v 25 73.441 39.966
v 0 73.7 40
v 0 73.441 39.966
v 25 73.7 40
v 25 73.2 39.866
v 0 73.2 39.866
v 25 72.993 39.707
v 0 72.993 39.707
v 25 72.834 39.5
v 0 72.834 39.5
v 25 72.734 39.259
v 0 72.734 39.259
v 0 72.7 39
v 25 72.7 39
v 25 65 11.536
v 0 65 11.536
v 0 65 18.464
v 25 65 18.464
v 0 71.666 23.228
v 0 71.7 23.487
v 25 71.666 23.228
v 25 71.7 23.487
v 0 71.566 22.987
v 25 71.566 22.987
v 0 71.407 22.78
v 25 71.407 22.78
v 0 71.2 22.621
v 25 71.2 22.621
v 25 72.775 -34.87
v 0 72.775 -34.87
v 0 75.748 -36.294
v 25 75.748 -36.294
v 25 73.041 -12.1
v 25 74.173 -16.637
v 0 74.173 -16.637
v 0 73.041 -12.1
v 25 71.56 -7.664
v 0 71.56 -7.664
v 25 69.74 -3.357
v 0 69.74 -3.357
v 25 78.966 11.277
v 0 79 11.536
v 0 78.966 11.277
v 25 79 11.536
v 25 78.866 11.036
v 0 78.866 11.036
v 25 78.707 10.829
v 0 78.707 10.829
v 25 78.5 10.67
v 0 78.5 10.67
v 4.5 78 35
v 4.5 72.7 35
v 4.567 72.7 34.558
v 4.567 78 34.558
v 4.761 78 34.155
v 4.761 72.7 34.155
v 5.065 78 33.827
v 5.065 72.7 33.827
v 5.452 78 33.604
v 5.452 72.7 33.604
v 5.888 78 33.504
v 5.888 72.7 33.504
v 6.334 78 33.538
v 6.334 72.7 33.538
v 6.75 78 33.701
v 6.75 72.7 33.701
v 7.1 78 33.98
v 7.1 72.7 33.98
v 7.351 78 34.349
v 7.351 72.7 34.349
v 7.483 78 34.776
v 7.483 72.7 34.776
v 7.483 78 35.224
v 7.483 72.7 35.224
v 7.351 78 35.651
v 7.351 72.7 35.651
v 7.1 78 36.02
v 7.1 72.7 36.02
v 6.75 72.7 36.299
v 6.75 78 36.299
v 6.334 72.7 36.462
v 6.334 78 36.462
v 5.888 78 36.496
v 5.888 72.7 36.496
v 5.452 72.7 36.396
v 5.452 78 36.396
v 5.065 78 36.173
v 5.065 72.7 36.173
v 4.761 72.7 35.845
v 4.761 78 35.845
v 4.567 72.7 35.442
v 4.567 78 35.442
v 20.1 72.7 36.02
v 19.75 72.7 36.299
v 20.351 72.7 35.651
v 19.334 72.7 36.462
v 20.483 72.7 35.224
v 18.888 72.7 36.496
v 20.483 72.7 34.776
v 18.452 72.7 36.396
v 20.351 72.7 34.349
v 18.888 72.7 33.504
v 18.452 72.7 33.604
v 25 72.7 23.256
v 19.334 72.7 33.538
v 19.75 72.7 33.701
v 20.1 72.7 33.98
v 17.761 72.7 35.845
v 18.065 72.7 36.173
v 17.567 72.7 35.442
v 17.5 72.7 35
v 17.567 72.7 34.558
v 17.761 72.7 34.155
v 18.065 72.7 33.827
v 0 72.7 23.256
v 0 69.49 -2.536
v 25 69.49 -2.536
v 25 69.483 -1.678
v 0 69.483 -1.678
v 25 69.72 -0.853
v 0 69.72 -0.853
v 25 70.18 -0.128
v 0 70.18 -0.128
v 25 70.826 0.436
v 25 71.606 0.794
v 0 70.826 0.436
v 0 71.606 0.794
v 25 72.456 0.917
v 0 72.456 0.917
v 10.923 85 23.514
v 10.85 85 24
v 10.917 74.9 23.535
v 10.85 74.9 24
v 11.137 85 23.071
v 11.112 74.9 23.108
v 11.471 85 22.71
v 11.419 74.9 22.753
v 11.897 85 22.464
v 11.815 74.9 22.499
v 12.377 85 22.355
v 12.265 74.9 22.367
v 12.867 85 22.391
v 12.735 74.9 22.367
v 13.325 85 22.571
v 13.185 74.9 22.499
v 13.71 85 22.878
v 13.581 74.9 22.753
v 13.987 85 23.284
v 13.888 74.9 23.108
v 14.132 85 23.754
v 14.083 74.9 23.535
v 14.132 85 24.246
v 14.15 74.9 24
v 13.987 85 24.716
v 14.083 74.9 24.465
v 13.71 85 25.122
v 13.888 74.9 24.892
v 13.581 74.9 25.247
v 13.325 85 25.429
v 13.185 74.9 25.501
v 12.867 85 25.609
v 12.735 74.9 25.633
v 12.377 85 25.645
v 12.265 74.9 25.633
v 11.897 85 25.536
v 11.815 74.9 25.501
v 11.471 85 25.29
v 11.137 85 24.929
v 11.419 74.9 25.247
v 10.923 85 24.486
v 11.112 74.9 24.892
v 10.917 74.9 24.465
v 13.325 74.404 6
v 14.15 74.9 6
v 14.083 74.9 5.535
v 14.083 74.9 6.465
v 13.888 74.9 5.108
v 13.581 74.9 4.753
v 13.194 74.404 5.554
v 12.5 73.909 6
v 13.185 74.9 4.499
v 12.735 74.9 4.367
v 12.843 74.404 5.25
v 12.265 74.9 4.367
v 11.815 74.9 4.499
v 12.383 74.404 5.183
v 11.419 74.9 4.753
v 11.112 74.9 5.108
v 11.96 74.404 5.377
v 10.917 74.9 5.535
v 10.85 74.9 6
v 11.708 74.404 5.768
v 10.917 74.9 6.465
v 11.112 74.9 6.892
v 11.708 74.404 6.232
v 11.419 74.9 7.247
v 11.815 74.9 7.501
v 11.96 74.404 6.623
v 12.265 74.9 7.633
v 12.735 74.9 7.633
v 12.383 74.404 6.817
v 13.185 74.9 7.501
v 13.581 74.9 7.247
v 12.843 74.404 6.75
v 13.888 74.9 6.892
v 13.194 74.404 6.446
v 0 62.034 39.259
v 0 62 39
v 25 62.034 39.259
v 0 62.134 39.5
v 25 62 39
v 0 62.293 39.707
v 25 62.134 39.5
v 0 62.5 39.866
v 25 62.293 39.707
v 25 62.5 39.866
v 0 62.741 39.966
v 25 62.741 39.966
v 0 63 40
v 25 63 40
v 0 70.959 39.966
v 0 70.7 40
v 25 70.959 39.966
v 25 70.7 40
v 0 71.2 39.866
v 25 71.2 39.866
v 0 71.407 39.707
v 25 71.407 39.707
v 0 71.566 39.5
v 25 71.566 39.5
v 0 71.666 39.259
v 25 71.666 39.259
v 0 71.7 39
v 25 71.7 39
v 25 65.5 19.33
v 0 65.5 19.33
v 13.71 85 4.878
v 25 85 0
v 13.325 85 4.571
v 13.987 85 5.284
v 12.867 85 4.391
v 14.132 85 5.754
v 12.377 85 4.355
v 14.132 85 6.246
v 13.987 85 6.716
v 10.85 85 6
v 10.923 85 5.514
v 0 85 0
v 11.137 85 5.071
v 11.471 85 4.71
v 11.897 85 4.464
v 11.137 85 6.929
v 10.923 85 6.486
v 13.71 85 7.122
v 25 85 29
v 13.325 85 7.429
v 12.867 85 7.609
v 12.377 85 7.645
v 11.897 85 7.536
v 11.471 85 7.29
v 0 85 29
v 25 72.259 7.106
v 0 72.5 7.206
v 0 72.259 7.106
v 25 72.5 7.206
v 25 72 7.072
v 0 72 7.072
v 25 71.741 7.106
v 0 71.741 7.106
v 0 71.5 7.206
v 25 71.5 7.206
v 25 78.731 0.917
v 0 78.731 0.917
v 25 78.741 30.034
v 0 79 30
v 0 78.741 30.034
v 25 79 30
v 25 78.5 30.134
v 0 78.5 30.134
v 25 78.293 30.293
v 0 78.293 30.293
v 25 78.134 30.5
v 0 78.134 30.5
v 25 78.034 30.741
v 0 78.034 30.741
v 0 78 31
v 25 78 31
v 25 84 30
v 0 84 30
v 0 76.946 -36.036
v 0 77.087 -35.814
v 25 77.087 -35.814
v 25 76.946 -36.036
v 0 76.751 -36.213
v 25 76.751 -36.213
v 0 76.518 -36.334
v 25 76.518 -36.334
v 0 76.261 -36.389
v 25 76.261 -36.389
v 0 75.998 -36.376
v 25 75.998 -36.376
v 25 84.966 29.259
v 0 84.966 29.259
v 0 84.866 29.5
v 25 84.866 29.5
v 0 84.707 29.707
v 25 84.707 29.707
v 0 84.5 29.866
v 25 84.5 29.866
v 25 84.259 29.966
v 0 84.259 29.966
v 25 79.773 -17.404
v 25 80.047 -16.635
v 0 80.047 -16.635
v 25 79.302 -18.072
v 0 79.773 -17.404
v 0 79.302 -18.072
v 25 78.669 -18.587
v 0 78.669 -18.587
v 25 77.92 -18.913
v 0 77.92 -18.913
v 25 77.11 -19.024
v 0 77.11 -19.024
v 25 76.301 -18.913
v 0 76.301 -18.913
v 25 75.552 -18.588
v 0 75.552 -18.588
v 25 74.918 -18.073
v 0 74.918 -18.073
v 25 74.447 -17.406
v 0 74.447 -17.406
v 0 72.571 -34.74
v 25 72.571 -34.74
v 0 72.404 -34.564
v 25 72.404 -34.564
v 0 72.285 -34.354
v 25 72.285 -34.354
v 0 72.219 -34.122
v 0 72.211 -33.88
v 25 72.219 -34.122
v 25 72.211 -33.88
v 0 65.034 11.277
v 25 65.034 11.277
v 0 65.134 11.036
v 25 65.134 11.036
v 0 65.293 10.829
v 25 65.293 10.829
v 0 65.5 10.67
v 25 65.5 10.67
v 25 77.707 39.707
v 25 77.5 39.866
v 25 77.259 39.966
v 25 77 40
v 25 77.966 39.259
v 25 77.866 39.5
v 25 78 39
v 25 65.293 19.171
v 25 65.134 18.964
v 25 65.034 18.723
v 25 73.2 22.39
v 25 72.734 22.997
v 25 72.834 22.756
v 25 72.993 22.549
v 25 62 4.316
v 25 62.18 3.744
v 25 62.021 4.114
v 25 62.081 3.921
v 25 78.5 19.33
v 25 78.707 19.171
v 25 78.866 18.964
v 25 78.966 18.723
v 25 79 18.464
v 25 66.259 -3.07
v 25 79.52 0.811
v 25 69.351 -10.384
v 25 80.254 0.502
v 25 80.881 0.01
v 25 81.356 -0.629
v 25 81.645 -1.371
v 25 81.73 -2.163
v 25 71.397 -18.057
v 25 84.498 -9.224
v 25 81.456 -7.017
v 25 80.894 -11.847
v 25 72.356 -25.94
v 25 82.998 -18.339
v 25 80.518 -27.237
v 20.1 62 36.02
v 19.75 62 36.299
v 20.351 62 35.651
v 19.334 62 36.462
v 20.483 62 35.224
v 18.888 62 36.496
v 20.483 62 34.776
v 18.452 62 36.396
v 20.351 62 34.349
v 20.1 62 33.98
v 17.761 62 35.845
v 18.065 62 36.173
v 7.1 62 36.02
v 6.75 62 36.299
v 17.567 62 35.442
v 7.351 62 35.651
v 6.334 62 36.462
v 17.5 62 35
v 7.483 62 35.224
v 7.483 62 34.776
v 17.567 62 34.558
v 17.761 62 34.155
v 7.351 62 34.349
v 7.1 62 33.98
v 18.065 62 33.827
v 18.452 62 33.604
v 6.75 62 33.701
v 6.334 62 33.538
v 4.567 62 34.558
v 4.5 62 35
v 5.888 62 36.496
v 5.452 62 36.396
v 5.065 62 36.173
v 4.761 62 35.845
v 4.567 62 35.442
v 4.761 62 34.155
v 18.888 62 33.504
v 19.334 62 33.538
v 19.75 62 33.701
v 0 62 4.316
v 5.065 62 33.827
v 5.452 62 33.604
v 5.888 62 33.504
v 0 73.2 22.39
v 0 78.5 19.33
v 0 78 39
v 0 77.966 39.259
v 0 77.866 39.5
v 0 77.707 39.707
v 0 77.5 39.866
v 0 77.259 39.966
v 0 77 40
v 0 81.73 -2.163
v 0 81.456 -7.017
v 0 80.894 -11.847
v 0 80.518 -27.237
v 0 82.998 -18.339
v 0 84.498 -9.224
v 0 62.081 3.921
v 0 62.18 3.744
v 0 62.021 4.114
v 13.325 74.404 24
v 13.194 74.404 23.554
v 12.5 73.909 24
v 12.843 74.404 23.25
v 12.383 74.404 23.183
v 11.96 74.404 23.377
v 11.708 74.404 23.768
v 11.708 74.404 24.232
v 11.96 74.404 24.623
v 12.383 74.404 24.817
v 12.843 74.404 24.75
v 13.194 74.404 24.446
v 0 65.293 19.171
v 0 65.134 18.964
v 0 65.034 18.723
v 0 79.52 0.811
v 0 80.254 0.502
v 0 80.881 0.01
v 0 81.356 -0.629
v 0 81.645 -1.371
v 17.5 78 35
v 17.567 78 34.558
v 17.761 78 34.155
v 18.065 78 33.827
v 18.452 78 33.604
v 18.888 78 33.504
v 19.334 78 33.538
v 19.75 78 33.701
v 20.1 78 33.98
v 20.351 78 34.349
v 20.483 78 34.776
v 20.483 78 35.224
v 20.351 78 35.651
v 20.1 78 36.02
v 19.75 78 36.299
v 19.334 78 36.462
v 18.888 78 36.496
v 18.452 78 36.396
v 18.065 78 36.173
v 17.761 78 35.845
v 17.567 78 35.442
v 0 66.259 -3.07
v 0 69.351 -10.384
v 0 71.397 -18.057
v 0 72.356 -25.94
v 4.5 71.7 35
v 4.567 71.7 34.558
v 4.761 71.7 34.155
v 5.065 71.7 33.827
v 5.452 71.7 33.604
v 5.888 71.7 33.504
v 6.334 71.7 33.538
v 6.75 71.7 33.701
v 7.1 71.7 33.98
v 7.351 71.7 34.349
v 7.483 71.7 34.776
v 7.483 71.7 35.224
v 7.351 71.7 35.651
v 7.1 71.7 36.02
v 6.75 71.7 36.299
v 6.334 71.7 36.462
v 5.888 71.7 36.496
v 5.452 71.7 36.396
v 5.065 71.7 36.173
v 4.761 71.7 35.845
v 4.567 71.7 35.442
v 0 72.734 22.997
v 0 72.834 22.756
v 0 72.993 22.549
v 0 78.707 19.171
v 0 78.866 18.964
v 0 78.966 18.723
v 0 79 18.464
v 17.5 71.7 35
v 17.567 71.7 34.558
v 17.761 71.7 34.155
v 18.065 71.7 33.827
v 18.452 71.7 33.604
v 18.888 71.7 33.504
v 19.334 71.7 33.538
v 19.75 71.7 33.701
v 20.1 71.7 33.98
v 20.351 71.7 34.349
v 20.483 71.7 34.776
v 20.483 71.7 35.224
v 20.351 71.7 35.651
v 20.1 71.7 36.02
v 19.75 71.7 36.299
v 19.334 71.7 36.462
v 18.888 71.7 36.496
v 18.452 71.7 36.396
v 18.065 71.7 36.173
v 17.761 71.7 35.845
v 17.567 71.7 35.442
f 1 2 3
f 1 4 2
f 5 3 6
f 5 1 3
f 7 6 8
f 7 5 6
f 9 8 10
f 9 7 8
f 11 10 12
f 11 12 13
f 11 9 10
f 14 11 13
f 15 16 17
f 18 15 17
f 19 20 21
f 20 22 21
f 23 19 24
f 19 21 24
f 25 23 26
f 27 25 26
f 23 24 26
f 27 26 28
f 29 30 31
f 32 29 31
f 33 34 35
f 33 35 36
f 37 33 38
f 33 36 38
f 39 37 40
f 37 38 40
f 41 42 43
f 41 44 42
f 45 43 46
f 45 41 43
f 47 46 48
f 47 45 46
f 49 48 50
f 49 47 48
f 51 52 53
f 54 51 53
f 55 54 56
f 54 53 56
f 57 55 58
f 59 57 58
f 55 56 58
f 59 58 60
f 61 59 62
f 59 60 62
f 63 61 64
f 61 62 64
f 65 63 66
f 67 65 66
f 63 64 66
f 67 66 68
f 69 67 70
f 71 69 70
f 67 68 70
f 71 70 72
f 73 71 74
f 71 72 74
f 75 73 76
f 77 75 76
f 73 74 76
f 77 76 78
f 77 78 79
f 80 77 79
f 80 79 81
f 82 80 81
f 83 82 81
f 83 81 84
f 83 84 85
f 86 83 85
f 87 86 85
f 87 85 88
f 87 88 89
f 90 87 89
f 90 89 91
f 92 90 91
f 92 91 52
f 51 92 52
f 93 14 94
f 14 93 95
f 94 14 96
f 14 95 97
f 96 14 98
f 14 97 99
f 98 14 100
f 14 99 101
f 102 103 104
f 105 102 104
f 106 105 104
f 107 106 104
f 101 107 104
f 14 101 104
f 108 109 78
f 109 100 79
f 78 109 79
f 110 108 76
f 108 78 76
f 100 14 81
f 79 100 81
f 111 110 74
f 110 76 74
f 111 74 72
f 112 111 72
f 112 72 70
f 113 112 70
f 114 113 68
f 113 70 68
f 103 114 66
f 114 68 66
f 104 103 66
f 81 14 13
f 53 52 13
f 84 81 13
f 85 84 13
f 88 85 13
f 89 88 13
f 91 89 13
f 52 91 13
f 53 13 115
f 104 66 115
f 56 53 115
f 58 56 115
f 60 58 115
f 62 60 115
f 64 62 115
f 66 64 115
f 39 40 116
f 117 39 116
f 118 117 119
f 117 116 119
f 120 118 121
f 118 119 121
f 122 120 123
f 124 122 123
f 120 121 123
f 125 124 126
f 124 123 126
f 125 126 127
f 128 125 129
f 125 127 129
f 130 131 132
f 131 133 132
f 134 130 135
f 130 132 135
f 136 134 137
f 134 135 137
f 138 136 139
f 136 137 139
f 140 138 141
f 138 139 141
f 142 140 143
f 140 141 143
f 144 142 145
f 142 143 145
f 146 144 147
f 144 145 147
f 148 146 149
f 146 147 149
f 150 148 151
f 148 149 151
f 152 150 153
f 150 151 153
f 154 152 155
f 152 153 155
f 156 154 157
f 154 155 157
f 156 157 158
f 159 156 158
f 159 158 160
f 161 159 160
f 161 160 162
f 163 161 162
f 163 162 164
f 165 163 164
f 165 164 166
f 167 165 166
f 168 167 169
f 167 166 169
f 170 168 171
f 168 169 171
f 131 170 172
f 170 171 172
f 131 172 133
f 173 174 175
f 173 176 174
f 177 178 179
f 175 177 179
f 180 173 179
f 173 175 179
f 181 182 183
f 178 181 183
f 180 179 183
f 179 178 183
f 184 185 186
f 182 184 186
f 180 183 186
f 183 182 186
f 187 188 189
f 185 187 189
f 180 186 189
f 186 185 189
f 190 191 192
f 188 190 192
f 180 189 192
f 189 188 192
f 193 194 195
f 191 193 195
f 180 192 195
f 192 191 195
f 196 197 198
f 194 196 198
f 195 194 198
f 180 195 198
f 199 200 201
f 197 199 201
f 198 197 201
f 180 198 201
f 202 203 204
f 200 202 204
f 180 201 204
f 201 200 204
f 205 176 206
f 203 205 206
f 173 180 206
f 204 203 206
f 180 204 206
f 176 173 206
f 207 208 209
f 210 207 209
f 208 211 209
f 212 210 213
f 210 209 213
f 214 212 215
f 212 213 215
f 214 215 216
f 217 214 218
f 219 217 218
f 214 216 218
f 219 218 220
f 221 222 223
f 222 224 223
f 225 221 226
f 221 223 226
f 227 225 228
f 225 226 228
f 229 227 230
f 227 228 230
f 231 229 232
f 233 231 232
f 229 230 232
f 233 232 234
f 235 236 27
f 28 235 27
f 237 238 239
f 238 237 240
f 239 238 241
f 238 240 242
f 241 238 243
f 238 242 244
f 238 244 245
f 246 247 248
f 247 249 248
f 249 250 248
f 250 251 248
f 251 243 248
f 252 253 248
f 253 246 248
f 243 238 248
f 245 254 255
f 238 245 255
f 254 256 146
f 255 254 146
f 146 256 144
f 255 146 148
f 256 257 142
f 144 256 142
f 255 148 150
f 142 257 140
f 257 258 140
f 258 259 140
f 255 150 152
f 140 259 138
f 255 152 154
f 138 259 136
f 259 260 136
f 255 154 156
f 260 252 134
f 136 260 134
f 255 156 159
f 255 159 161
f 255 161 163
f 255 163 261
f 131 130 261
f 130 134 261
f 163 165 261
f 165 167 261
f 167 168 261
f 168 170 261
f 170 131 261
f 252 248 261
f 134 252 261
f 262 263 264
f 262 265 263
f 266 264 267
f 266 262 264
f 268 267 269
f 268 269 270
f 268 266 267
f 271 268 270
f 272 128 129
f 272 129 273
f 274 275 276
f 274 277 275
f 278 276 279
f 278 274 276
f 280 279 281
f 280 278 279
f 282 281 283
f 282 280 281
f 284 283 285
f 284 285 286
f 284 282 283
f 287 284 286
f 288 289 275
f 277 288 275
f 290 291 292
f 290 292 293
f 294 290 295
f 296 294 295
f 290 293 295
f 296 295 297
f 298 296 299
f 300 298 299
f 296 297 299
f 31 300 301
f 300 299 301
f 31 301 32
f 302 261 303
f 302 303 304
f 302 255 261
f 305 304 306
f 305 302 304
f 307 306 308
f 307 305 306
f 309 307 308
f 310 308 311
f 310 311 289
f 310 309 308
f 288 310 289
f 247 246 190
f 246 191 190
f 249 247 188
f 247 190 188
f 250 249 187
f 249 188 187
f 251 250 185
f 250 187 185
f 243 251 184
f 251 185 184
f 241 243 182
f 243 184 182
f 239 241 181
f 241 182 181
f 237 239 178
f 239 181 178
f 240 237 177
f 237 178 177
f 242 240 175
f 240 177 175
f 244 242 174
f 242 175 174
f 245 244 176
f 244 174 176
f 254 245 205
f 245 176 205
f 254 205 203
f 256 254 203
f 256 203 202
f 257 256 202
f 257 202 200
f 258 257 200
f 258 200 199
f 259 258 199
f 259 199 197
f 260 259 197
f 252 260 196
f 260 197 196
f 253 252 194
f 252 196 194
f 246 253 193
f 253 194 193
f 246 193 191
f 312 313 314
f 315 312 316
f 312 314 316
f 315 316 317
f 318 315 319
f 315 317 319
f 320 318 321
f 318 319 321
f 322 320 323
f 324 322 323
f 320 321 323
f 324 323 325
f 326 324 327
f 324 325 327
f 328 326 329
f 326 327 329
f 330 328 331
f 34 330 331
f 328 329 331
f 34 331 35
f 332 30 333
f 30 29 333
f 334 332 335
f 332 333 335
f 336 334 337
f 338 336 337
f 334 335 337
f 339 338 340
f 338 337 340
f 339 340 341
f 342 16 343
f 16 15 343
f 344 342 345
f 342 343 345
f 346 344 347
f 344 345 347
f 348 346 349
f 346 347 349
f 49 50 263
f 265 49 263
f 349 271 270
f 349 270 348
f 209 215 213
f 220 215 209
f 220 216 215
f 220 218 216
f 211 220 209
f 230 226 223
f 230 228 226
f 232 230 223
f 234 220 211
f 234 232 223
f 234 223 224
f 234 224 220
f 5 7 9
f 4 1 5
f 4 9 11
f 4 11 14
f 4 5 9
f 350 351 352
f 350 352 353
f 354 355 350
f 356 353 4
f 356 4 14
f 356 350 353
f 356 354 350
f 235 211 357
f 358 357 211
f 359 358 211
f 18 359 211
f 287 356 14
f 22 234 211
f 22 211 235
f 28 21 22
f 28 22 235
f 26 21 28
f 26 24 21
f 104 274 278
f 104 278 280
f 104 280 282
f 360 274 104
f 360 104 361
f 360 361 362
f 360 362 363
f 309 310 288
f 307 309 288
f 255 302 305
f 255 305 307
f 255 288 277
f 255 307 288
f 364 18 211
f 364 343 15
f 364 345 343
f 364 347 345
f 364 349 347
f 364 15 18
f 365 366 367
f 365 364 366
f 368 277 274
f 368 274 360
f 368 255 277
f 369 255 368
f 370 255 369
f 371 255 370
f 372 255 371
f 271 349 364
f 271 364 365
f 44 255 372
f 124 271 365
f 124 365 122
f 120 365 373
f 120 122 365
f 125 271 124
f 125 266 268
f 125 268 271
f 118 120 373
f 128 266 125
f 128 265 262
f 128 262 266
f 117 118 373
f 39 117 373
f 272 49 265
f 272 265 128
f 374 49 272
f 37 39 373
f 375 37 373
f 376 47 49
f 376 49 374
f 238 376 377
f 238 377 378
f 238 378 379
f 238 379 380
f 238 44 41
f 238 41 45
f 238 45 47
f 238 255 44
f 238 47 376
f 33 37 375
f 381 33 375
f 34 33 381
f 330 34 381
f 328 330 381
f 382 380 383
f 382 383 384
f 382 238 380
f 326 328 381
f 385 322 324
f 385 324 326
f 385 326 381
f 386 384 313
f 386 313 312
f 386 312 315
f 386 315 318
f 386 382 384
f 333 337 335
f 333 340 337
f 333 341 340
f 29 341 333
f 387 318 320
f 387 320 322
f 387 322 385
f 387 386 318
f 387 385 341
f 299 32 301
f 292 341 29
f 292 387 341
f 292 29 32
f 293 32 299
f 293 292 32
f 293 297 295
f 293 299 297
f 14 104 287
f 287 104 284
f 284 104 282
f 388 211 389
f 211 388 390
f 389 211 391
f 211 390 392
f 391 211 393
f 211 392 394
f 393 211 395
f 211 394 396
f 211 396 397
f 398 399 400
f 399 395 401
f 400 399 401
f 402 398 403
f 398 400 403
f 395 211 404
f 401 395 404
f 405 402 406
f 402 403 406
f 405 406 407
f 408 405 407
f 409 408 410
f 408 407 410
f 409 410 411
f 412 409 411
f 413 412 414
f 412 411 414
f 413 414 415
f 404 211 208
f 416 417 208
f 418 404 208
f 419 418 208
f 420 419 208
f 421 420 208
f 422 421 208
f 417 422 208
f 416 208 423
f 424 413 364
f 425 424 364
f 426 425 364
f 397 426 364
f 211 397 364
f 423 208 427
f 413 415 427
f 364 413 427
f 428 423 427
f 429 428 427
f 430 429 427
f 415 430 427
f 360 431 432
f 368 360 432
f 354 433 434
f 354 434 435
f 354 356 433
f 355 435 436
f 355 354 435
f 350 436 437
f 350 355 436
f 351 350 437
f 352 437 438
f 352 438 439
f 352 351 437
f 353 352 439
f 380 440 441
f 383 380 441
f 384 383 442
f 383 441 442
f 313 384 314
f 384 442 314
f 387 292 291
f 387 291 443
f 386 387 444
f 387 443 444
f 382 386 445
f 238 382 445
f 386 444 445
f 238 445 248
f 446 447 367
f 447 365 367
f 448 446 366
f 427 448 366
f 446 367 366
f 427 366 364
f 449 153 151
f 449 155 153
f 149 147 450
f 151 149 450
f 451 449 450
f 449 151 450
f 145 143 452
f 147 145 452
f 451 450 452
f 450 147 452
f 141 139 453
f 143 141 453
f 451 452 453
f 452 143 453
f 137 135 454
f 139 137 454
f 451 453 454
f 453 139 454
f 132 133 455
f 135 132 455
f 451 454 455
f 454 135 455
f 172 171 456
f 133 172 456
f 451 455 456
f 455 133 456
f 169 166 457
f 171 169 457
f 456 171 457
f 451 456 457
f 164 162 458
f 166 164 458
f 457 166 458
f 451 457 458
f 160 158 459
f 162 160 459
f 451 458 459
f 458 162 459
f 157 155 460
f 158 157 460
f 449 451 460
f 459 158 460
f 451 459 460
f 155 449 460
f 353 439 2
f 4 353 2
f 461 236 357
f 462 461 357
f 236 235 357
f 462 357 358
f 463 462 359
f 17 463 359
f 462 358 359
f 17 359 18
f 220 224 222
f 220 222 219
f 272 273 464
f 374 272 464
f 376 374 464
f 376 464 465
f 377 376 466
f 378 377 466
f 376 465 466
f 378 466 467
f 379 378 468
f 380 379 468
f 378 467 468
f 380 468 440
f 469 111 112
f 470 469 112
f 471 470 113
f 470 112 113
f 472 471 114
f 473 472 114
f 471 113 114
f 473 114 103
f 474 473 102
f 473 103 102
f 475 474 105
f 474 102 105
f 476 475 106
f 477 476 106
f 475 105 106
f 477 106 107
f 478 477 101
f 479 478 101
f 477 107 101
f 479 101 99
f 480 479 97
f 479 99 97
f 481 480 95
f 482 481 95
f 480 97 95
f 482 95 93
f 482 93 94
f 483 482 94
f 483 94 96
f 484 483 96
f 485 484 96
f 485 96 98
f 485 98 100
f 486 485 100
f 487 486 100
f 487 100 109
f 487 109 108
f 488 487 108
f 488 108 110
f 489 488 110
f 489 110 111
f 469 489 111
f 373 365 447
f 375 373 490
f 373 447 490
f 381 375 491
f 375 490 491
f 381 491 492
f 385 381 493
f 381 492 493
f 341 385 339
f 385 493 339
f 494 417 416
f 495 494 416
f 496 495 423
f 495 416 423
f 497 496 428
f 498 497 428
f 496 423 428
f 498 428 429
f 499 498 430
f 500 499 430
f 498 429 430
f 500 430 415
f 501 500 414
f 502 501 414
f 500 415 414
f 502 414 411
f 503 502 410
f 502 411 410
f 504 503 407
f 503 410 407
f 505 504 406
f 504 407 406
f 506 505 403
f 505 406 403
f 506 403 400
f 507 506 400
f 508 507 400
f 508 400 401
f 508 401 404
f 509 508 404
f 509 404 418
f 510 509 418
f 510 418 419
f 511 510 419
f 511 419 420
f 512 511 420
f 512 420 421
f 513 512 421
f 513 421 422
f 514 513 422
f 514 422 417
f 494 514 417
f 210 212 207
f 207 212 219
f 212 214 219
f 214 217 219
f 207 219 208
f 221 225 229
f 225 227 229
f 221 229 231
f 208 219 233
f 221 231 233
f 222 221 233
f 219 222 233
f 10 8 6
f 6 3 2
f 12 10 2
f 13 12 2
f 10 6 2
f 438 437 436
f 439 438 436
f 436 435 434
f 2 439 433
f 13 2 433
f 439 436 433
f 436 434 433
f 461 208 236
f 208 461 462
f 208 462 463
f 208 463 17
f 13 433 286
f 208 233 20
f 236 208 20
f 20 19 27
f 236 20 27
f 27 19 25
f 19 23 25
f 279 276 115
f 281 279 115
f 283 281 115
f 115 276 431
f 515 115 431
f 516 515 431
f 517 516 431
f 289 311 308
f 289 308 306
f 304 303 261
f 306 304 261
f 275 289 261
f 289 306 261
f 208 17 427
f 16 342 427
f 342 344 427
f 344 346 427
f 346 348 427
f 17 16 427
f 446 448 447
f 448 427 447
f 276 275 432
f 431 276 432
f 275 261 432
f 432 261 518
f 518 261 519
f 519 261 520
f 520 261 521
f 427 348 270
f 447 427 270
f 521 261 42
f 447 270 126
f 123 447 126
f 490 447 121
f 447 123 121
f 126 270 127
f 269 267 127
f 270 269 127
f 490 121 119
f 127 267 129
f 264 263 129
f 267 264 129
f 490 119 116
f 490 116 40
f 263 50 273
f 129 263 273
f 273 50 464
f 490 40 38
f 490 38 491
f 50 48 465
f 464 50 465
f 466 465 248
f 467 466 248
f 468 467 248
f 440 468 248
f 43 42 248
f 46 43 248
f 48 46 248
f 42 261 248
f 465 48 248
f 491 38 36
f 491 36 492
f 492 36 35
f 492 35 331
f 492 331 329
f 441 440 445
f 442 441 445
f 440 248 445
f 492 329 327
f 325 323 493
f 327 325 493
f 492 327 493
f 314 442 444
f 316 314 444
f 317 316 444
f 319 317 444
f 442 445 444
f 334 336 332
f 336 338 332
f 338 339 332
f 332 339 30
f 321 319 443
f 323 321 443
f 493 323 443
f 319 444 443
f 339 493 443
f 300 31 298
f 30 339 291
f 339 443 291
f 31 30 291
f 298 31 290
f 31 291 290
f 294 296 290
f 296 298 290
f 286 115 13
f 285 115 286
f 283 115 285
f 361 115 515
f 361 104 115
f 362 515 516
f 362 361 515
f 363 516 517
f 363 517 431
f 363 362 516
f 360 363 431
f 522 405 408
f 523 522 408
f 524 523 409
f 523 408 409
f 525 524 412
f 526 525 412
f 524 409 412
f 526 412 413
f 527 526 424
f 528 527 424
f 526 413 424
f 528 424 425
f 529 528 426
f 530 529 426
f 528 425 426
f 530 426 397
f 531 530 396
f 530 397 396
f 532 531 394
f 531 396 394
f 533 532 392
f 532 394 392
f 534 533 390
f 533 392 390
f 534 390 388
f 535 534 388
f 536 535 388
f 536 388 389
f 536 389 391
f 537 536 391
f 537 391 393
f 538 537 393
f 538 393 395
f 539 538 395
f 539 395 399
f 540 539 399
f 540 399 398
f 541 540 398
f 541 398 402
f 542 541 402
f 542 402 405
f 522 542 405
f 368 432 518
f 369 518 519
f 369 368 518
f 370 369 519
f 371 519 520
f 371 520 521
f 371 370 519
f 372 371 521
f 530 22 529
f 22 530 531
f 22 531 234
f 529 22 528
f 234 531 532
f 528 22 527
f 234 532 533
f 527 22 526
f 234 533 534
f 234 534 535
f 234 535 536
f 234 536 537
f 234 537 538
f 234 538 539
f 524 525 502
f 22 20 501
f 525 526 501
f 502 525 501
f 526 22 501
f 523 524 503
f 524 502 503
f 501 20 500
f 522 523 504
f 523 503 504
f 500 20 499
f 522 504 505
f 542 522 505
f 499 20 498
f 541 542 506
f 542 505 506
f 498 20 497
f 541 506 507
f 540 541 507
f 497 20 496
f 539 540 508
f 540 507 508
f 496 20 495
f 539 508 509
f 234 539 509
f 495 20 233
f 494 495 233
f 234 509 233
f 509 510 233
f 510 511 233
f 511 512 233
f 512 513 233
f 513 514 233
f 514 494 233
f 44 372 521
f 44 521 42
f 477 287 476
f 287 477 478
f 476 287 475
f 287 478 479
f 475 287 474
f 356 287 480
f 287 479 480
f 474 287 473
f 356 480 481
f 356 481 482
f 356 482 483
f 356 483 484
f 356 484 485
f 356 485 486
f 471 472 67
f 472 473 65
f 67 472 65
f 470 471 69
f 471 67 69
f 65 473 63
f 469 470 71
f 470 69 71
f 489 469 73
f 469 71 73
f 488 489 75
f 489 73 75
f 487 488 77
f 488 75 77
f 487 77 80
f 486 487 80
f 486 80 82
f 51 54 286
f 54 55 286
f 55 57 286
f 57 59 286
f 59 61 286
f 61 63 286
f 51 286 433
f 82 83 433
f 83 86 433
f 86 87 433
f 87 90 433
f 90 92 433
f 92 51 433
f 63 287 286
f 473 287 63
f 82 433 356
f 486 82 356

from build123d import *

# Parameters (mm, degrees)
BOSS_EXTRUDE1_DEPTH   = 25
FILLET1_R             = 1
F_3_0MM_DOWEL_HOLE1_D = 3
M4_TAPPED_HOLE1_D     = 3.3
M4_TAPPED_HOLE1_DEPTH = 10.1
M4_TAPPED_HOLE1_TIP   = 0.991420021


with BuildPart() as part:
    # Sketch1 → Boss-Extrude1 (new body)
    with BuildSketch(Plane(origin=(0, 0, 0), x_dir=(0, 0, -1), z_dir=(1, 0, 0))):
        with BuildLine():
            Line((0, 85), (-30, 85))
            Line((-30, 85), (-30, 78))
            Line((-30, 78), (-40, 78))
            Line((-40, 78), (-40, 72.7))
            Line((-40, 72.7), (-22.67875858, 72.7))
            Line((-22.67875858, 72.7), (-19.041451884, 79))
            Line((-19.041451884, 79), (-10.958548116, 79))
            Line((-10.958548116, 79), (-6.917096231, 72))
            Line((-6.917096231, 72), (-10.958548116, 65))
            Line((-10.958548116, 65), (-19.041451884, 65))
            Line((-19.041451884, 65), (-22.909698688, 71.7))
            Line((-22.909698688, 71.7), (-40, 71.7))
            Line((-40, 71.7), (-40, 62))
            Line((-40, 62), (-4, 62))
            ThreePointArc((-4, 62), (14.367926682, 70.556066939), (34.568411175, 72.145858848))
            Line((34.568411175, 72.145858848), (36.728936873, 76.654975026))
            ThreePointArc((36.728936873, 76.654975026), (18.832513412, 82.887492655), (0, 85))
        make_face()
        with BuildLine():
            Line((-0.917096231, 72.45580085), (-0.917096231, 78.731121633))
            ThreePointArc((-0.917096231, 78.731121633), (-0.009883557, 80.880596268), (2.163064575, 81.730050482))
            ThreePointArc((2.163064575, 81.730050482), (9.436412465, 81.210823112), (16.634722164, 80.046553355))
            ThreePointArc((16.634722164, 80.046553355), (19.024323748, 77.110478101), (16.637014487, 74.172538667))
            ThreePointArc((16.637014487, 74.172538667), (9.867798138, 72.343342951), (3.357045186, 69.739817851))
            ThreePointArc((3.357045186, 69.739817851), (0.473932708, 69.9237637), (-0.917096231, 72.45580085))
        make_face(mode=Mode.SUBTRACT)
    extrude(amount=BOSS_EXTRUDE1_DEPTH)

    # Fillet1
    fillet1_edges = [part.edges().sort_by_distance(p)[0] for p in [
        (12.5, 76.654975026, -36.728936873),
        (12.5, 72.145858848, -34.568411175),
        (12.5, 62, 4),
        (12.5, 62, 40),
        (12.5, 71.7, 40),
        (12.5, 71.7, 22.909698688),
        (12.5, 65, 19.041451884),
        (12.5, 65, 10.958548116),
        (12.5, 72, 6.917096231),
        (12.5, 79, 10.958548116),
        (12.5, 79, 19.041451884),
        (12.5, 72.7, 22.67875858),
        (12.5, 72.7, 40),
        (12.5, 78, 40),
        (12.5, 78, 30),
        (12.5, 85, 30),
    ]]
    fillet(fillet1_edges, radius=FILLET1_R)

    # Ø3.0mm Dowel Hole1 (through all)
    with Locations(Plane(origin=(0, 78, 0), x_dir=(1, 0, 0), z_dir=(0, 1, 0))):
        with Locations((6, -35), (19, -35)):
            Hole(F_3_0MM_DOWEL_HOLE1_D / 2)

    # M4 Tapped Hole1
    with Locations(Plane(origin=(0, 85, 0), x_dir=(1, 0, 0), z_dir=(0, 1, 0))):
        with Locations((12.5, -24), (12.5, -6)):
            Hole(M4_TAPPED_HOLE1_D / 2, depth=M4_TAPPED_HOLE1_DEPTH)
            with Locations((0, 0, -(M4_TAPPED_HOLE1_DEPTH + M4_TAPPED_HOLE1_TIP / 2))):  # 118° drill point
                Cone(0, M4_TAPPED_HOLE1_D / 2, M4_TAPPED_HOLE1_TIP, mode=Mode.SUBTRACT)


solid = part.part
